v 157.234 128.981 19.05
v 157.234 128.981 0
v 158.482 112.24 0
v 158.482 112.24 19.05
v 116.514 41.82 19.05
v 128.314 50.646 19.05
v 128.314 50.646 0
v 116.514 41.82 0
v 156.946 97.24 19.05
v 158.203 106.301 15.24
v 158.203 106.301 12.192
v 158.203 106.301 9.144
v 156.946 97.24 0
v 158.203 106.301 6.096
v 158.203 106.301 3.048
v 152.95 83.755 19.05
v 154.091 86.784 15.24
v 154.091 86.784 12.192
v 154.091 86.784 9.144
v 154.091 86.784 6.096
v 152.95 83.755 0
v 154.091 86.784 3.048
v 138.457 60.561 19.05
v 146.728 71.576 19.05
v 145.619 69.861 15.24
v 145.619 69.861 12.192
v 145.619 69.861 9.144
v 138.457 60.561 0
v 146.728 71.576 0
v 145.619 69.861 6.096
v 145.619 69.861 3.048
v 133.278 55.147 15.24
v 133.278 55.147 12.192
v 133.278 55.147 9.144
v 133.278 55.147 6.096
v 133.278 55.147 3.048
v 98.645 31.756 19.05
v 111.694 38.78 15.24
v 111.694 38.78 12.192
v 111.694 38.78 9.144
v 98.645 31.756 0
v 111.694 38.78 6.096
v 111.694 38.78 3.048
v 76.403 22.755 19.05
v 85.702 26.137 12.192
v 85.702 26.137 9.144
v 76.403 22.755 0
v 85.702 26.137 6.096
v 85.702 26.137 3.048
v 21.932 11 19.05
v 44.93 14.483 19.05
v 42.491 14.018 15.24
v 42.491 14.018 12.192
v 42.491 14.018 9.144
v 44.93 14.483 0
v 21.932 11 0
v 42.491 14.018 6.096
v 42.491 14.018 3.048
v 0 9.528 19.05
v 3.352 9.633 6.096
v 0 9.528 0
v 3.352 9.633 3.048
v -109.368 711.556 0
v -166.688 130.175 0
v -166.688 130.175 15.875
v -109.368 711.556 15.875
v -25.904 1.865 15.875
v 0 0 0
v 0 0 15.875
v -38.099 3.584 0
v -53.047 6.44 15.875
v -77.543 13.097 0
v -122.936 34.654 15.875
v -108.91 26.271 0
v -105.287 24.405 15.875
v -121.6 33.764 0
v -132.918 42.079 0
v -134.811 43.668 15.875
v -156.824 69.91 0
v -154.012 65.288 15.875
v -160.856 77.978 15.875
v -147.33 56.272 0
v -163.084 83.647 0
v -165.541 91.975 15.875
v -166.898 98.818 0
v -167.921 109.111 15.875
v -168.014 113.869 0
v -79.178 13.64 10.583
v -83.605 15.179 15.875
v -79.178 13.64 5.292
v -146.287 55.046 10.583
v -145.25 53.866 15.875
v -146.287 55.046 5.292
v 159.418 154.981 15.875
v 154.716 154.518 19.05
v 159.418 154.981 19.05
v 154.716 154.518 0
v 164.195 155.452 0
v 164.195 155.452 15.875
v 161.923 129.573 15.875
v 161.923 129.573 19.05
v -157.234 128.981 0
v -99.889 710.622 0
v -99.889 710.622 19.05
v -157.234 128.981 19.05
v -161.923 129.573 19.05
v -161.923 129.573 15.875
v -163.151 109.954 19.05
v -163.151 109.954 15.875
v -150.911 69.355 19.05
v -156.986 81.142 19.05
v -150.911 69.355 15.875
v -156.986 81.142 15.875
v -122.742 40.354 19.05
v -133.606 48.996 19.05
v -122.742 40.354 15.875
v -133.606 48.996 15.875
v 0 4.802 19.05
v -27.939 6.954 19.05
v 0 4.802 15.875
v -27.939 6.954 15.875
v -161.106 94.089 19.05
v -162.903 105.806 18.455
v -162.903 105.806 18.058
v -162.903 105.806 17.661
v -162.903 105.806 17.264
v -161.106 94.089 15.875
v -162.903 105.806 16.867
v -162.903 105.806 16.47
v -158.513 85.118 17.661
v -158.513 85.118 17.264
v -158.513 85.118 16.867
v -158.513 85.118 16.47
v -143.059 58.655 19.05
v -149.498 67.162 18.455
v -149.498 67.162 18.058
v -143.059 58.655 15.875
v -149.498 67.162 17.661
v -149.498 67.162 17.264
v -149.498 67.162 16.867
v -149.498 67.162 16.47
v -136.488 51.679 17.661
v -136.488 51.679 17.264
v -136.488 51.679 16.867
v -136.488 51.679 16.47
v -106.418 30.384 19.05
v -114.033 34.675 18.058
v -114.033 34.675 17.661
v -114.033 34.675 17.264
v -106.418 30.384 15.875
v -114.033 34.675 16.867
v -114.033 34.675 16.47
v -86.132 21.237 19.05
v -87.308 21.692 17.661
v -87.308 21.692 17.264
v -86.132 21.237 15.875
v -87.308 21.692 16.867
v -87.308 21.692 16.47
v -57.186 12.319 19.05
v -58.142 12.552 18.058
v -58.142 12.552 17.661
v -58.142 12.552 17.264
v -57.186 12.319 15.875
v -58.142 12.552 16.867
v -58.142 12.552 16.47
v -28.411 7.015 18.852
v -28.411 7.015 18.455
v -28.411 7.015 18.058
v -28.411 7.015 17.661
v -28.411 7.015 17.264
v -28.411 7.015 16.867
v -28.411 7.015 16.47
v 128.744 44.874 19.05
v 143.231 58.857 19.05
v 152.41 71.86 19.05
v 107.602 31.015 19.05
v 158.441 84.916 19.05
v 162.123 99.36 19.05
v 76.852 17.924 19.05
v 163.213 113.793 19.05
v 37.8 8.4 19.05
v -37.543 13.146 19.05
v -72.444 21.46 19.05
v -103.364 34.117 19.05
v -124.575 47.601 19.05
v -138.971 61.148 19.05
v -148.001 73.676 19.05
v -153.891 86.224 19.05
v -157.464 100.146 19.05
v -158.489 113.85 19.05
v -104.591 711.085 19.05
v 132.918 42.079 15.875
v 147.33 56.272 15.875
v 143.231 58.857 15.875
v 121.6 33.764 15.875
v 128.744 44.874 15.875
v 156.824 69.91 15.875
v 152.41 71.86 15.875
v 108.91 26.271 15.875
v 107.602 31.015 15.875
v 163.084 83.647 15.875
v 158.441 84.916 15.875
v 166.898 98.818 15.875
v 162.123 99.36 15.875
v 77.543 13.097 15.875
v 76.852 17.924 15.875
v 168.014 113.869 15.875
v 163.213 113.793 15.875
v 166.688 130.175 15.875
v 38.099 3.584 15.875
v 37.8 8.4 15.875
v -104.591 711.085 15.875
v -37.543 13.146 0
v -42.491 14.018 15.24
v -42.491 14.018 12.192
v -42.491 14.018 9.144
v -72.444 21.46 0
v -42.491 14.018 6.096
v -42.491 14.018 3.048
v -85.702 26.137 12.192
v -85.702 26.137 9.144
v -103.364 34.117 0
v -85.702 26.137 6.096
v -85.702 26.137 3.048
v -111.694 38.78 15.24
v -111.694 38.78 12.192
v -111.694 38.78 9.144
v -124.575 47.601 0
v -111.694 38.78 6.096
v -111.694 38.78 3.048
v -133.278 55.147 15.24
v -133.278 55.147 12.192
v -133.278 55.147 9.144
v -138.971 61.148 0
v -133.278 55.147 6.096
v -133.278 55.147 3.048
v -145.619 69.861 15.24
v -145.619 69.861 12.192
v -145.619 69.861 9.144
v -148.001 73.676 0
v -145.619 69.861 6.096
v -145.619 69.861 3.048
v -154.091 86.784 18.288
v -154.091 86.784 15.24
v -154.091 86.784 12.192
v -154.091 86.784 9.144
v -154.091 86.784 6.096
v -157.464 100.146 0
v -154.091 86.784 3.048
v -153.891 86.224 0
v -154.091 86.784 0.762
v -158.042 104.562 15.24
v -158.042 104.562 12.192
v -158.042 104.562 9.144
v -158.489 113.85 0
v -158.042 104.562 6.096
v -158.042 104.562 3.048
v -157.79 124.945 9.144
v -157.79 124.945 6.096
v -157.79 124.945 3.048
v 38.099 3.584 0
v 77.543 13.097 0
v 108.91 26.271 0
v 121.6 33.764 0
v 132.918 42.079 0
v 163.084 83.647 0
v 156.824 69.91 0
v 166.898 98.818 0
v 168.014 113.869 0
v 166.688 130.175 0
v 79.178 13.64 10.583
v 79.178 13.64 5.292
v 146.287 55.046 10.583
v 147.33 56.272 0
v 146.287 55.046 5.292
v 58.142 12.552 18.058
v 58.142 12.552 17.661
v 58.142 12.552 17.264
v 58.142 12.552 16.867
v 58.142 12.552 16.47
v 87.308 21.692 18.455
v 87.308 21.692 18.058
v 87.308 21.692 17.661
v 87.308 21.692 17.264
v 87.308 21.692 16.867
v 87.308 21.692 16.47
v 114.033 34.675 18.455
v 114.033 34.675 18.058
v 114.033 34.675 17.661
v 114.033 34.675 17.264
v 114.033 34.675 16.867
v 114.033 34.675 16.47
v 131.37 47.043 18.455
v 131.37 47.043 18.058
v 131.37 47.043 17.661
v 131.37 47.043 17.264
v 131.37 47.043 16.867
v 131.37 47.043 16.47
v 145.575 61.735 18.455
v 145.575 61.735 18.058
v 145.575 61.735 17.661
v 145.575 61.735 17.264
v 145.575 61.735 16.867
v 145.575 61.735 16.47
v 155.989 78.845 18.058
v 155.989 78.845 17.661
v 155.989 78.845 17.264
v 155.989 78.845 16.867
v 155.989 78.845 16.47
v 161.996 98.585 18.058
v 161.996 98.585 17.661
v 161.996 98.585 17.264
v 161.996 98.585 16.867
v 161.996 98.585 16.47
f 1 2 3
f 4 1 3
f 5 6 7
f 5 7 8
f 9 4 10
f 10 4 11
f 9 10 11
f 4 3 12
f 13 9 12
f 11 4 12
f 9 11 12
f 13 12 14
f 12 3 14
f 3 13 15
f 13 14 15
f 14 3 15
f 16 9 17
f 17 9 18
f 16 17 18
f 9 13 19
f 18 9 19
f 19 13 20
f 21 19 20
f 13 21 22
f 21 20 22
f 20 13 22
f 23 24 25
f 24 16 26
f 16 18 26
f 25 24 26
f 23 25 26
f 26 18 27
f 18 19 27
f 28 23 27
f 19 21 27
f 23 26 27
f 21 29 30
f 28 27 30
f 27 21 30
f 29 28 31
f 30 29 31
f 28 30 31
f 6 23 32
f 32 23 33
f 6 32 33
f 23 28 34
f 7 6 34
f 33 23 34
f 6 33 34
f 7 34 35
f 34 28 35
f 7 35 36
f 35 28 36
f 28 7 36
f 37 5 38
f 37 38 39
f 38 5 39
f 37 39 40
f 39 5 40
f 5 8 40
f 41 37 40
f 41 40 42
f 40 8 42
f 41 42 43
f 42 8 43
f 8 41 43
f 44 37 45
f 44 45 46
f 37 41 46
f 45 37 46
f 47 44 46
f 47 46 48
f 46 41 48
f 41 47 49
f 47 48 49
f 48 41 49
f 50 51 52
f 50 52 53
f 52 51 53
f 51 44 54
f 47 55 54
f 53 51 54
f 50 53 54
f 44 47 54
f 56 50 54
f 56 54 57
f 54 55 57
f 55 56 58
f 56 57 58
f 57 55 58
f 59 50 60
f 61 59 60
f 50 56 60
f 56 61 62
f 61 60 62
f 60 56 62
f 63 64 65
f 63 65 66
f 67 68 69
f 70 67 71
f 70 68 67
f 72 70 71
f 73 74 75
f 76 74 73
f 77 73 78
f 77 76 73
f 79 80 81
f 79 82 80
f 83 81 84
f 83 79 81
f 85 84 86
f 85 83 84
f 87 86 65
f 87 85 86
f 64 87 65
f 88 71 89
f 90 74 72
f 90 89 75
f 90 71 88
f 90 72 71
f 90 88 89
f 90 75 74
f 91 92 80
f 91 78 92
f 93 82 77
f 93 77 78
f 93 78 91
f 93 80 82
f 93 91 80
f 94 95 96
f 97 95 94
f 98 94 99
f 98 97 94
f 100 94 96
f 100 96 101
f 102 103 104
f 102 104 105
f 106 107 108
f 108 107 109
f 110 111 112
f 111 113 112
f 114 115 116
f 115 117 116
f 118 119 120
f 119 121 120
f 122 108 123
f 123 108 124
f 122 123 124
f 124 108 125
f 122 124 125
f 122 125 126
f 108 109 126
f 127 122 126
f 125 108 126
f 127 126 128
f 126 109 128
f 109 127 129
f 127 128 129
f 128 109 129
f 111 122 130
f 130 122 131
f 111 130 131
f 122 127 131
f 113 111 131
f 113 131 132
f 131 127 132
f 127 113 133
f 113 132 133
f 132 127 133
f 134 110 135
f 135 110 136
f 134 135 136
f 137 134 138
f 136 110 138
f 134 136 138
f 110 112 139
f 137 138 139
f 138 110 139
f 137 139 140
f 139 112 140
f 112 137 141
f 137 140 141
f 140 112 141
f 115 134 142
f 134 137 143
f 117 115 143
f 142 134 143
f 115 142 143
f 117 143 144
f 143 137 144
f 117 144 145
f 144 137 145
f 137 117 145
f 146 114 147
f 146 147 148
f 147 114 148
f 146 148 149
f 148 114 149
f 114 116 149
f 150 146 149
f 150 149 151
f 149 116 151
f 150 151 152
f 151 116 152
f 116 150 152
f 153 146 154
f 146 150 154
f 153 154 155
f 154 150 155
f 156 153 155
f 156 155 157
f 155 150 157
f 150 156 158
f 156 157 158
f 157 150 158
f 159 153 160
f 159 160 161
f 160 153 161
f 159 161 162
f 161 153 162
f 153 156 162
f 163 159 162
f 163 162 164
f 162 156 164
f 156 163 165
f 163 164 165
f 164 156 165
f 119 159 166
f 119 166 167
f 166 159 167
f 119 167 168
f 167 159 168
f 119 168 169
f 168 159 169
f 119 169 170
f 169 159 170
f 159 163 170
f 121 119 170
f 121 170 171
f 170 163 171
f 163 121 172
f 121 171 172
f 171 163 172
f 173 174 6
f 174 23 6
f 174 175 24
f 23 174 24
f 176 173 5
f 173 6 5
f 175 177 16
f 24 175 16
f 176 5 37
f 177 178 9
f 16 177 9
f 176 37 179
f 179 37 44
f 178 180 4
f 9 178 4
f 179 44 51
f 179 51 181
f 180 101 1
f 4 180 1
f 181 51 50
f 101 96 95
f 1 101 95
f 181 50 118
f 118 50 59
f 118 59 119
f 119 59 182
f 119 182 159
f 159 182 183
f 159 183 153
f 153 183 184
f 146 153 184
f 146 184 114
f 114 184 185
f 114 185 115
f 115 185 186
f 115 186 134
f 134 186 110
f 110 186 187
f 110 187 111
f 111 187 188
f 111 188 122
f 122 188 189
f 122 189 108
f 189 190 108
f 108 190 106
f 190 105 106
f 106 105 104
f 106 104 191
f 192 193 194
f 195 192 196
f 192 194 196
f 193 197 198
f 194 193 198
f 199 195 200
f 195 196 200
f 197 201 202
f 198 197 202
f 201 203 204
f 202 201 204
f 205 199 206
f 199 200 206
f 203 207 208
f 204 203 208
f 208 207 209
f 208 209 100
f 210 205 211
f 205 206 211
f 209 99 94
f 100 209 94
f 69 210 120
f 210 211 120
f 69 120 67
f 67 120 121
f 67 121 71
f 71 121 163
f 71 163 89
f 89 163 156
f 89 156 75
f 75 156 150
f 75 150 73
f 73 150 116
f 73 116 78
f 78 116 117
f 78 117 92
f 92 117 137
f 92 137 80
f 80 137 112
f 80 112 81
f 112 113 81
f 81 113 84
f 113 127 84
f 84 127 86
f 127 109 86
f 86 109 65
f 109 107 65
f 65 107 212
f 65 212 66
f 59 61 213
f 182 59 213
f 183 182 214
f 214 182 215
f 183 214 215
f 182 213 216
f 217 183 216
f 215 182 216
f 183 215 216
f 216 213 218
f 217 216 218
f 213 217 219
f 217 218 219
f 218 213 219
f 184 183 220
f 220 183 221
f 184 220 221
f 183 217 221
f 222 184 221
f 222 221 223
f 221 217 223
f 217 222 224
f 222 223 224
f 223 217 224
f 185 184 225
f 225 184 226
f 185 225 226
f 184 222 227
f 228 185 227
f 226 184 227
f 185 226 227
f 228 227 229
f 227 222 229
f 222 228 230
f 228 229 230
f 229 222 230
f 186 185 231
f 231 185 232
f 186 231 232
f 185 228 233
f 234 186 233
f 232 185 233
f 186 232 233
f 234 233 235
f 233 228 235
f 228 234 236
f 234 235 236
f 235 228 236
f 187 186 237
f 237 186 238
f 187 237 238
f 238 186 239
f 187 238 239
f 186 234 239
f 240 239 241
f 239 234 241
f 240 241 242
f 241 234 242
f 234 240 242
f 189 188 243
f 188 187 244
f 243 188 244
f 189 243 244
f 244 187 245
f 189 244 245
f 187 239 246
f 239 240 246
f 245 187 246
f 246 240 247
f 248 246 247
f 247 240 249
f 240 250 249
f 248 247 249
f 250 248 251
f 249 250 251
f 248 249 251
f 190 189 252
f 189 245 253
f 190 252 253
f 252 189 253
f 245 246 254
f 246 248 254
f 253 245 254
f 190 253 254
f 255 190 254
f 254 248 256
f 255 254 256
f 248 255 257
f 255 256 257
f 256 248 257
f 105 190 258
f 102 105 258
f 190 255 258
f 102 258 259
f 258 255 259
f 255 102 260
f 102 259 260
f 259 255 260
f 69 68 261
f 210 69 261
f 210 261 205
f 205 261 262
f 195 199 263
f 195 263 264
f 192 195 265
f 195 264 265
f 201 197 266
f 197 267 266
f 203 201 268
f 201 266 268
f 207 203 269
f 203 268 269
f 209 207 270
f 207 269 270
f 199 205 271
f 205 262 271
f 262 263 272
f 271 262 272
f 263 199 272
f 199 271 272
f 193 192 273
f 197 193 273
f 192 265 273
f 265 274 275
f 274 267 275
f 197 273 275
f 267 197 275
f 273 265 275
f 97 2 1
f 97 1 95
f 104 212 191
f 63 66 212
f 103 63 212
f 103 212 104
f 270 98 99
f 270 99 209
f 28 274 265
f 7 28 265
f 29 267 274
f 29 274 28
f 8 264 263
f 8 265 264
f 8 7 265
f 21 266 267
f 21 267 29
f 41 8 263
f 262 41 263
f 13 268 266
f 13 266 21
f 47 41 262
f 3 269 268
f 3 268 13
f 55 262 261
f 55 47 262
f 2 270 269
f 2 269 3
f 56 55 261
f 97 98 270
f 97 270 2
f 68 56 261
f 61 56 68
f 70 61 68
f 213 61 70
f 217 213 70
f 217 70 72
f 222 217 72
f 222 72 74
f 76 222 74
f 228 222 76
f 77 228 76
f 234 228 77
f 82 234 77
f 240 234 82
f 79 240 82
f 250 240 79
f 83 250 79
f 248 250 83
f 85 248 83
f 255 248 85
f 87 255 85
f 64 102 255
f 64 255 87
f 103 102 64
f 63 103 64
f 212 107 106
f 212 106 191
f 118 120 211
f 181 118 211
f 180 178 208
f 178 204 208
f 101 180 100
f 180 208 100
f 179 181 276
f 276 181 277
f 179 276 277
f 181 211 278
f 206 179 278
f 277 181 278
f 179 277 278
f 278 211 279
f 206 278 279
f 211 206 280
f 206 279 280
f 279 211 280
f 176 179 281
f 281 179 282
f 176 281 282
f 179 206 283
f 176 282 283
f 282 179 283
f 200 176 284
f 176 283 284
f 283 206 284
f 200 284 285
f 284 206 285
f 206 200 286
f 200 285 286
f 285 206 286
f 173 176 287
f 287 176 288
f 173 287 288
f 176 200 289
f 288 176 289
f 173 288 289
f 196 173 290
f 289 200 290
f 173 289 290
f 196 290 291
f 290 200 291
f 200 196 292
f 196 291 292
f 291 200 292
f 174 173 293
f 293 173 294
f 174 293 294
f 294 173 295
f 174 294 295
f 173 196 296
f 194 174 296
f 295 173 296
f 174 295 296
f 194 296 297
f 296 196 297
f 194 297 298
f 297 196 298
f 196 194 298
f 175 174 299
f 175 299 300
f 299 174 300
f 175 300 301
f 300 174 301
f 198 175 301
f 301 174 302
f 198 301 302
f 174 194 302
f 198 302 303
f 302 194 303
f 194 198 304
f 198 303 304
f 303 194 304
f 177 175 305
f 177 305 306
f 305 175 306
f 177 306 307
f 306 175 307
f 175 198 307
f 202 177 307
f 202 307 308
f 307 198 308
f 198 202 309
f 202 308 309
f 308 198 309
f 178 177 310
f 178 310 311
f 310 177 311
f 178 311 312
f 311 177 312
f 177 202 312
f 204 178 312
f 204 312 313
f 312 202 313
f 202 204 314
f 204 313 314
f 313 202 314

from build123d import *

# Parameters (mm, degrees)
BOSS_EXTRUDE1_DEPTH = 19.05
CUT_EXTRUDE1_START  = -3.175
CUT_EXTRUDE1_DEPTH  = 3.175


# Read off the part's stored shape, not the designer's step: Cut-Extrude1
with BuildPart() as part:
    # Sketch1 → Boss-Extrude1 (new body)
    with BuildSketch(Plane.XY):
        with BuildLine():
            Line((157.234081882, 128.980548454), (154.716315658, 154.51789158))
            Line((154.716315658, 154.51789158), (164.195357535, 155.452445004))
            Line((164.195357535, 155.452445004), (166.6875, 130.175))
            add(Edge.make_bspline(
                [(0, 0), (73.666580622, 1.740675992), (181.188092361, 36.200835609), (166.6875, 130.175)],
                knots=[0, 0, 0, 0, 1, 1, 1, 1], degree=3))
            add(Edge.make_bspline(
                [(0, 0), (-73.666580622, 1.740675992), (-181.188092361, 36.200835609), (-166.6875, 130.175)],
                knots=[0, 0, 0, 0, 1, 1, 1, 1], degree=3))
            Line((-166.6875, 130.175), (-109.368223301, 711.556235093))
            Line((-109.368223301, 711.556235093), (-99.889181424, 710.621681669))
            Line((-99.889181424, 710.621681669), (-157.234081882, 128.980548454))
            add(Edge.make_bspline(
                [(0, 9.52776174), (-1.117611602, 9.555193192), (-3.340472897, 9.624755056), (-7.880039481, 9.827207732), (-13.652210416, 10.198958437), (-20.725459036, 10.840441372), (-30.303235723, 11.962316267), (-42.47749757, 13.875858033), (-57.165232888, 17.02314898), (-71.689613059, 21.050850851), (-90.515854195, 27.626537064), (-112.436111514, 38.157452487), (-130.643933928, 51.803557723), (-142.189146149, 64.564536934), (-149.192253507, 75.075537554), (-153.541361304, 84.674022673), (-156.058613173, 92.923629982), (-157.442658539, 99.418206789), (-158.29640922, 106.242287005), (-158.540175044, 112.221426054), (-158.437150466, 117.190167219), (-158.20642164, 121.010360535), (-157.881730698, 124.277278241), (-157.584058118, 126.601085874), (-157.415798733, 127.781927866), (-157.316566229, 128.446705395), (-157.261207353, 128.804756083), (-157.234081882, 128.980548454)],
                knots=[0.001057036, 0.001057036, 0.001057036, 0.001057036, 0.016679825, 0.032302613, 0.063548191, 0.094793768, 0.126039346, 0.1885305, 0.251021655, 0.31351281, 0.376003965, 0.500986274, 0.625968584, 0.688459739, 0.750950893, 0.813442048, 0.844687626, 0.875933203, 0.90717878, 0.938424358, 0.954047147, 0.969669935, 0.985292724, 0.993104118, 0.997009815, 0.998962664, 1.000915513, 1.000915513, 1.000915513, 1.000915513], degree=3))
            add(Edge.make_bspline(
                [(157.234081882, 128.980548454), (157.261207353, 128.804756083), (157.316566229, 128.446705395), (157.415798733, 127.781927866), (157.584058118, 126.601085874), (157.881730698, 124.277278241), (158.20642164, 121.010360535), (158.437150466, 117.190167219), (158.540175044, 112.221426054), (158.29640922, 106.242287005), (157.442658539, 99.418206789), (156.058613173, 92.923629982), (153.541361304, 84.674022673), (149.192253507, 75.075537554), (142.189146149, 64.564536934), (130.643933928, 51.803557723), (112.436111514, 38.157452487), (90.515854195, 27.626537064), (71.689613059, 21.050850851), (57.165232888, 17.02314898), (42.47749757, 13.875858033), (30.303235723, 11.962316267), (20.725459036, 10.840441372), (13.652210416, 10.198958437), (7.880039481, 9.827207732), (3.340472897, 9.624755056), (1.117611602, 9.555193192), (0, 9.52776174)],
                knots=[0.001057036, 0.001057036, 0.001057036, 0.001057036, 0.003009885, 0.004962733, 0.00886843, 0.016679825, 0.032302613, 0.047925402, 0.063548191, 0.094793768, 0.126039346, 0.157284923, 0.1885305, 0.251021655, 0.31351281, 0.376003965, 0.500986274, 0.625968584, 0.688459739, 0.750950893, 0.813442048, 0.875933203, 0.90717878, 0.938424358, 0.969669935, 0.985292724, 1.000915513, 1.000915513, 1.000915513, 1.000915513], degree=3))
        make_face()
    extrude(amount=BOSS_EXTRUDE1_DEPTH)

    # Cut-Extrude1 outline → Cut-Extrude1 (cut)
    with BuildSketch(Plane.XY.offset(19.05).offset(CUT_EXTRUDE1_START)):
        with BuildLine():
            add(Edge.make_bspline(
                [(0, 4.801965673), (9.039076986, 5.019645615), (18.615343357, 5.740087083), (38.206551494, 8.290420977), (48.221803102, 10.120302171), (68.063126794, 14.983315661), (77.889169822, 18.016665839), (96.726604846, 25.367412999), (105.737388343, 29.685039413), (122.329339782, 39.664160586), (129.908900725, 45.324695844), (139.777007016, 54.855777785), (142.816728459, 58.206110887), (148.333510848, 65.263042796), (150.810694166, 68.969494834), (155.143109198, 76.756286204), (156.998589935, 80.836629029), (160.026646994, 89.399867478), (161.199415591, 93.883005077), (162.79196327, 103.287974059), (163.211691294, 108.210111051), (163.215151327, 115.948212654), (163.111865799, 118.586683423), (162.792061754, 122.635654517), (162.657978395, 124.000517644), (162.414585492, 126.070904339), (162.282321945, 127.11187023), (162.109292482, 128.336489493), (162.031100506, 128.86350908), (161.978072787, 129.215341168), (161.951296998, 129.389464404), (161.922977269, 129.572996421)],
                knots=[0, 0, 0, 0, 0.125, 0.125, 0.25, 0.25, 0.375, 0.375, 0.5, 0.5, 0.625, 0.625, 0.6875, 0.6875, 0.75, 0.75, 0.8125, 0.8125, 0.875, 0.875, 0.9375, 0.9375, 0.96875, 0.96875, 0.984375, 0.984375, 0.9921875, 0.99609375, 0.998046875, 0.998046875, 1, 1, 1, 1], degree=3))
            add(Edge.make_bspline(
                [(-161.922977269, 129.572996421), (-161.951296998, 129.389464404), (-161.978072787, 129.215341168), (-162.031100506, 128.86350908), (-162.109292482, 128.336489493), (-162.282321945, 127.11187023), (-162.590936716, 124.682949208), (-162.792061754, 122.635654517), (-163.111865799, 118.586683423), (-163.215151327, 115.948212654), (-163.211691294, 108.210111051), (-162.79196327, 103.287974059), (-161.199415591, 93.883005077), (-160.026646994, 89.399867478), (-156.998589935, 80.836629029), (-155.143109198, 76.756286204), (-150.810694166, 68.969494834), (-148.333510848, 65.263042796), (-142.816728459, 58.206110887), (-139.777007016, 54.855777785), (-129.908900725, 45.324695844), (-122.329339782, 39.664160586), (-105.737388343, 29.685039413), (-96.726604846, 25.367412999), (-77.889169822, 18.016665839), (-68.063126794, 14.983315661), (-48.221803102, 10.120302171), (-38.206551494, 8.290420977), (-18.615343357, 5.740087083), (-9.039076986, 5.019645615), (0, 4.801965673)],
                knots=[0, 0, 0, 0, 0.001953125, 0.001953125, 0.00390625, 0.0078125, 0.015625, 0.03125, 0.03125, 0.0625, 0.0625, 0.125, 0.125, 0.1875, 0.1875, 0.25, 0.25, 0.3125, 0.3125, 0.375, 0.375, 0.5, 0.5, 0.625, 0.625, 0.75, 0.75, 0.875, 0.875, 1, 1, 1, 1], degree=3))
            Line((-161.922977269, 129.572996421), (-104.590786195, 711.085220167))
            Line((-104.590786195, 711.085220167), (-109.368223301, 711.556235093))
            Line((-109.368223301, 711.556235093), (-166.6875, 130.175))
            add(Edge.make_bspline(
                [(-166.6875, 130.175), (-181.188092361, 36.200835609), (-73.666580622, 1.740675992), (0, 0)],
                knots=[0, 0, 0, 0, 1, 1, 1, 1], degree=3))
            add(Edge.make_bspline(
                [(0, 0), (73.666580622, 1.740675992), (181.188092361, 36.200835609), (166.6875, 130.175)],
                knots=[0, 0, 0, 0, 1, 1, 1, 1], degree=3))
            Line((166.6875, 130.175), (164.195357535, 155.452445004))
            Line((164.195357535, 155.452445004), (159.417920429, 154.981430078))
            Line((159.417920429, 154.981430078), (161.922977269, 129.572996421))
        make_face()
    extrude(amount=CUT_EXTRUDE1_DEPTH, mode=Mode.SUBTRACT)


solid = part.part
